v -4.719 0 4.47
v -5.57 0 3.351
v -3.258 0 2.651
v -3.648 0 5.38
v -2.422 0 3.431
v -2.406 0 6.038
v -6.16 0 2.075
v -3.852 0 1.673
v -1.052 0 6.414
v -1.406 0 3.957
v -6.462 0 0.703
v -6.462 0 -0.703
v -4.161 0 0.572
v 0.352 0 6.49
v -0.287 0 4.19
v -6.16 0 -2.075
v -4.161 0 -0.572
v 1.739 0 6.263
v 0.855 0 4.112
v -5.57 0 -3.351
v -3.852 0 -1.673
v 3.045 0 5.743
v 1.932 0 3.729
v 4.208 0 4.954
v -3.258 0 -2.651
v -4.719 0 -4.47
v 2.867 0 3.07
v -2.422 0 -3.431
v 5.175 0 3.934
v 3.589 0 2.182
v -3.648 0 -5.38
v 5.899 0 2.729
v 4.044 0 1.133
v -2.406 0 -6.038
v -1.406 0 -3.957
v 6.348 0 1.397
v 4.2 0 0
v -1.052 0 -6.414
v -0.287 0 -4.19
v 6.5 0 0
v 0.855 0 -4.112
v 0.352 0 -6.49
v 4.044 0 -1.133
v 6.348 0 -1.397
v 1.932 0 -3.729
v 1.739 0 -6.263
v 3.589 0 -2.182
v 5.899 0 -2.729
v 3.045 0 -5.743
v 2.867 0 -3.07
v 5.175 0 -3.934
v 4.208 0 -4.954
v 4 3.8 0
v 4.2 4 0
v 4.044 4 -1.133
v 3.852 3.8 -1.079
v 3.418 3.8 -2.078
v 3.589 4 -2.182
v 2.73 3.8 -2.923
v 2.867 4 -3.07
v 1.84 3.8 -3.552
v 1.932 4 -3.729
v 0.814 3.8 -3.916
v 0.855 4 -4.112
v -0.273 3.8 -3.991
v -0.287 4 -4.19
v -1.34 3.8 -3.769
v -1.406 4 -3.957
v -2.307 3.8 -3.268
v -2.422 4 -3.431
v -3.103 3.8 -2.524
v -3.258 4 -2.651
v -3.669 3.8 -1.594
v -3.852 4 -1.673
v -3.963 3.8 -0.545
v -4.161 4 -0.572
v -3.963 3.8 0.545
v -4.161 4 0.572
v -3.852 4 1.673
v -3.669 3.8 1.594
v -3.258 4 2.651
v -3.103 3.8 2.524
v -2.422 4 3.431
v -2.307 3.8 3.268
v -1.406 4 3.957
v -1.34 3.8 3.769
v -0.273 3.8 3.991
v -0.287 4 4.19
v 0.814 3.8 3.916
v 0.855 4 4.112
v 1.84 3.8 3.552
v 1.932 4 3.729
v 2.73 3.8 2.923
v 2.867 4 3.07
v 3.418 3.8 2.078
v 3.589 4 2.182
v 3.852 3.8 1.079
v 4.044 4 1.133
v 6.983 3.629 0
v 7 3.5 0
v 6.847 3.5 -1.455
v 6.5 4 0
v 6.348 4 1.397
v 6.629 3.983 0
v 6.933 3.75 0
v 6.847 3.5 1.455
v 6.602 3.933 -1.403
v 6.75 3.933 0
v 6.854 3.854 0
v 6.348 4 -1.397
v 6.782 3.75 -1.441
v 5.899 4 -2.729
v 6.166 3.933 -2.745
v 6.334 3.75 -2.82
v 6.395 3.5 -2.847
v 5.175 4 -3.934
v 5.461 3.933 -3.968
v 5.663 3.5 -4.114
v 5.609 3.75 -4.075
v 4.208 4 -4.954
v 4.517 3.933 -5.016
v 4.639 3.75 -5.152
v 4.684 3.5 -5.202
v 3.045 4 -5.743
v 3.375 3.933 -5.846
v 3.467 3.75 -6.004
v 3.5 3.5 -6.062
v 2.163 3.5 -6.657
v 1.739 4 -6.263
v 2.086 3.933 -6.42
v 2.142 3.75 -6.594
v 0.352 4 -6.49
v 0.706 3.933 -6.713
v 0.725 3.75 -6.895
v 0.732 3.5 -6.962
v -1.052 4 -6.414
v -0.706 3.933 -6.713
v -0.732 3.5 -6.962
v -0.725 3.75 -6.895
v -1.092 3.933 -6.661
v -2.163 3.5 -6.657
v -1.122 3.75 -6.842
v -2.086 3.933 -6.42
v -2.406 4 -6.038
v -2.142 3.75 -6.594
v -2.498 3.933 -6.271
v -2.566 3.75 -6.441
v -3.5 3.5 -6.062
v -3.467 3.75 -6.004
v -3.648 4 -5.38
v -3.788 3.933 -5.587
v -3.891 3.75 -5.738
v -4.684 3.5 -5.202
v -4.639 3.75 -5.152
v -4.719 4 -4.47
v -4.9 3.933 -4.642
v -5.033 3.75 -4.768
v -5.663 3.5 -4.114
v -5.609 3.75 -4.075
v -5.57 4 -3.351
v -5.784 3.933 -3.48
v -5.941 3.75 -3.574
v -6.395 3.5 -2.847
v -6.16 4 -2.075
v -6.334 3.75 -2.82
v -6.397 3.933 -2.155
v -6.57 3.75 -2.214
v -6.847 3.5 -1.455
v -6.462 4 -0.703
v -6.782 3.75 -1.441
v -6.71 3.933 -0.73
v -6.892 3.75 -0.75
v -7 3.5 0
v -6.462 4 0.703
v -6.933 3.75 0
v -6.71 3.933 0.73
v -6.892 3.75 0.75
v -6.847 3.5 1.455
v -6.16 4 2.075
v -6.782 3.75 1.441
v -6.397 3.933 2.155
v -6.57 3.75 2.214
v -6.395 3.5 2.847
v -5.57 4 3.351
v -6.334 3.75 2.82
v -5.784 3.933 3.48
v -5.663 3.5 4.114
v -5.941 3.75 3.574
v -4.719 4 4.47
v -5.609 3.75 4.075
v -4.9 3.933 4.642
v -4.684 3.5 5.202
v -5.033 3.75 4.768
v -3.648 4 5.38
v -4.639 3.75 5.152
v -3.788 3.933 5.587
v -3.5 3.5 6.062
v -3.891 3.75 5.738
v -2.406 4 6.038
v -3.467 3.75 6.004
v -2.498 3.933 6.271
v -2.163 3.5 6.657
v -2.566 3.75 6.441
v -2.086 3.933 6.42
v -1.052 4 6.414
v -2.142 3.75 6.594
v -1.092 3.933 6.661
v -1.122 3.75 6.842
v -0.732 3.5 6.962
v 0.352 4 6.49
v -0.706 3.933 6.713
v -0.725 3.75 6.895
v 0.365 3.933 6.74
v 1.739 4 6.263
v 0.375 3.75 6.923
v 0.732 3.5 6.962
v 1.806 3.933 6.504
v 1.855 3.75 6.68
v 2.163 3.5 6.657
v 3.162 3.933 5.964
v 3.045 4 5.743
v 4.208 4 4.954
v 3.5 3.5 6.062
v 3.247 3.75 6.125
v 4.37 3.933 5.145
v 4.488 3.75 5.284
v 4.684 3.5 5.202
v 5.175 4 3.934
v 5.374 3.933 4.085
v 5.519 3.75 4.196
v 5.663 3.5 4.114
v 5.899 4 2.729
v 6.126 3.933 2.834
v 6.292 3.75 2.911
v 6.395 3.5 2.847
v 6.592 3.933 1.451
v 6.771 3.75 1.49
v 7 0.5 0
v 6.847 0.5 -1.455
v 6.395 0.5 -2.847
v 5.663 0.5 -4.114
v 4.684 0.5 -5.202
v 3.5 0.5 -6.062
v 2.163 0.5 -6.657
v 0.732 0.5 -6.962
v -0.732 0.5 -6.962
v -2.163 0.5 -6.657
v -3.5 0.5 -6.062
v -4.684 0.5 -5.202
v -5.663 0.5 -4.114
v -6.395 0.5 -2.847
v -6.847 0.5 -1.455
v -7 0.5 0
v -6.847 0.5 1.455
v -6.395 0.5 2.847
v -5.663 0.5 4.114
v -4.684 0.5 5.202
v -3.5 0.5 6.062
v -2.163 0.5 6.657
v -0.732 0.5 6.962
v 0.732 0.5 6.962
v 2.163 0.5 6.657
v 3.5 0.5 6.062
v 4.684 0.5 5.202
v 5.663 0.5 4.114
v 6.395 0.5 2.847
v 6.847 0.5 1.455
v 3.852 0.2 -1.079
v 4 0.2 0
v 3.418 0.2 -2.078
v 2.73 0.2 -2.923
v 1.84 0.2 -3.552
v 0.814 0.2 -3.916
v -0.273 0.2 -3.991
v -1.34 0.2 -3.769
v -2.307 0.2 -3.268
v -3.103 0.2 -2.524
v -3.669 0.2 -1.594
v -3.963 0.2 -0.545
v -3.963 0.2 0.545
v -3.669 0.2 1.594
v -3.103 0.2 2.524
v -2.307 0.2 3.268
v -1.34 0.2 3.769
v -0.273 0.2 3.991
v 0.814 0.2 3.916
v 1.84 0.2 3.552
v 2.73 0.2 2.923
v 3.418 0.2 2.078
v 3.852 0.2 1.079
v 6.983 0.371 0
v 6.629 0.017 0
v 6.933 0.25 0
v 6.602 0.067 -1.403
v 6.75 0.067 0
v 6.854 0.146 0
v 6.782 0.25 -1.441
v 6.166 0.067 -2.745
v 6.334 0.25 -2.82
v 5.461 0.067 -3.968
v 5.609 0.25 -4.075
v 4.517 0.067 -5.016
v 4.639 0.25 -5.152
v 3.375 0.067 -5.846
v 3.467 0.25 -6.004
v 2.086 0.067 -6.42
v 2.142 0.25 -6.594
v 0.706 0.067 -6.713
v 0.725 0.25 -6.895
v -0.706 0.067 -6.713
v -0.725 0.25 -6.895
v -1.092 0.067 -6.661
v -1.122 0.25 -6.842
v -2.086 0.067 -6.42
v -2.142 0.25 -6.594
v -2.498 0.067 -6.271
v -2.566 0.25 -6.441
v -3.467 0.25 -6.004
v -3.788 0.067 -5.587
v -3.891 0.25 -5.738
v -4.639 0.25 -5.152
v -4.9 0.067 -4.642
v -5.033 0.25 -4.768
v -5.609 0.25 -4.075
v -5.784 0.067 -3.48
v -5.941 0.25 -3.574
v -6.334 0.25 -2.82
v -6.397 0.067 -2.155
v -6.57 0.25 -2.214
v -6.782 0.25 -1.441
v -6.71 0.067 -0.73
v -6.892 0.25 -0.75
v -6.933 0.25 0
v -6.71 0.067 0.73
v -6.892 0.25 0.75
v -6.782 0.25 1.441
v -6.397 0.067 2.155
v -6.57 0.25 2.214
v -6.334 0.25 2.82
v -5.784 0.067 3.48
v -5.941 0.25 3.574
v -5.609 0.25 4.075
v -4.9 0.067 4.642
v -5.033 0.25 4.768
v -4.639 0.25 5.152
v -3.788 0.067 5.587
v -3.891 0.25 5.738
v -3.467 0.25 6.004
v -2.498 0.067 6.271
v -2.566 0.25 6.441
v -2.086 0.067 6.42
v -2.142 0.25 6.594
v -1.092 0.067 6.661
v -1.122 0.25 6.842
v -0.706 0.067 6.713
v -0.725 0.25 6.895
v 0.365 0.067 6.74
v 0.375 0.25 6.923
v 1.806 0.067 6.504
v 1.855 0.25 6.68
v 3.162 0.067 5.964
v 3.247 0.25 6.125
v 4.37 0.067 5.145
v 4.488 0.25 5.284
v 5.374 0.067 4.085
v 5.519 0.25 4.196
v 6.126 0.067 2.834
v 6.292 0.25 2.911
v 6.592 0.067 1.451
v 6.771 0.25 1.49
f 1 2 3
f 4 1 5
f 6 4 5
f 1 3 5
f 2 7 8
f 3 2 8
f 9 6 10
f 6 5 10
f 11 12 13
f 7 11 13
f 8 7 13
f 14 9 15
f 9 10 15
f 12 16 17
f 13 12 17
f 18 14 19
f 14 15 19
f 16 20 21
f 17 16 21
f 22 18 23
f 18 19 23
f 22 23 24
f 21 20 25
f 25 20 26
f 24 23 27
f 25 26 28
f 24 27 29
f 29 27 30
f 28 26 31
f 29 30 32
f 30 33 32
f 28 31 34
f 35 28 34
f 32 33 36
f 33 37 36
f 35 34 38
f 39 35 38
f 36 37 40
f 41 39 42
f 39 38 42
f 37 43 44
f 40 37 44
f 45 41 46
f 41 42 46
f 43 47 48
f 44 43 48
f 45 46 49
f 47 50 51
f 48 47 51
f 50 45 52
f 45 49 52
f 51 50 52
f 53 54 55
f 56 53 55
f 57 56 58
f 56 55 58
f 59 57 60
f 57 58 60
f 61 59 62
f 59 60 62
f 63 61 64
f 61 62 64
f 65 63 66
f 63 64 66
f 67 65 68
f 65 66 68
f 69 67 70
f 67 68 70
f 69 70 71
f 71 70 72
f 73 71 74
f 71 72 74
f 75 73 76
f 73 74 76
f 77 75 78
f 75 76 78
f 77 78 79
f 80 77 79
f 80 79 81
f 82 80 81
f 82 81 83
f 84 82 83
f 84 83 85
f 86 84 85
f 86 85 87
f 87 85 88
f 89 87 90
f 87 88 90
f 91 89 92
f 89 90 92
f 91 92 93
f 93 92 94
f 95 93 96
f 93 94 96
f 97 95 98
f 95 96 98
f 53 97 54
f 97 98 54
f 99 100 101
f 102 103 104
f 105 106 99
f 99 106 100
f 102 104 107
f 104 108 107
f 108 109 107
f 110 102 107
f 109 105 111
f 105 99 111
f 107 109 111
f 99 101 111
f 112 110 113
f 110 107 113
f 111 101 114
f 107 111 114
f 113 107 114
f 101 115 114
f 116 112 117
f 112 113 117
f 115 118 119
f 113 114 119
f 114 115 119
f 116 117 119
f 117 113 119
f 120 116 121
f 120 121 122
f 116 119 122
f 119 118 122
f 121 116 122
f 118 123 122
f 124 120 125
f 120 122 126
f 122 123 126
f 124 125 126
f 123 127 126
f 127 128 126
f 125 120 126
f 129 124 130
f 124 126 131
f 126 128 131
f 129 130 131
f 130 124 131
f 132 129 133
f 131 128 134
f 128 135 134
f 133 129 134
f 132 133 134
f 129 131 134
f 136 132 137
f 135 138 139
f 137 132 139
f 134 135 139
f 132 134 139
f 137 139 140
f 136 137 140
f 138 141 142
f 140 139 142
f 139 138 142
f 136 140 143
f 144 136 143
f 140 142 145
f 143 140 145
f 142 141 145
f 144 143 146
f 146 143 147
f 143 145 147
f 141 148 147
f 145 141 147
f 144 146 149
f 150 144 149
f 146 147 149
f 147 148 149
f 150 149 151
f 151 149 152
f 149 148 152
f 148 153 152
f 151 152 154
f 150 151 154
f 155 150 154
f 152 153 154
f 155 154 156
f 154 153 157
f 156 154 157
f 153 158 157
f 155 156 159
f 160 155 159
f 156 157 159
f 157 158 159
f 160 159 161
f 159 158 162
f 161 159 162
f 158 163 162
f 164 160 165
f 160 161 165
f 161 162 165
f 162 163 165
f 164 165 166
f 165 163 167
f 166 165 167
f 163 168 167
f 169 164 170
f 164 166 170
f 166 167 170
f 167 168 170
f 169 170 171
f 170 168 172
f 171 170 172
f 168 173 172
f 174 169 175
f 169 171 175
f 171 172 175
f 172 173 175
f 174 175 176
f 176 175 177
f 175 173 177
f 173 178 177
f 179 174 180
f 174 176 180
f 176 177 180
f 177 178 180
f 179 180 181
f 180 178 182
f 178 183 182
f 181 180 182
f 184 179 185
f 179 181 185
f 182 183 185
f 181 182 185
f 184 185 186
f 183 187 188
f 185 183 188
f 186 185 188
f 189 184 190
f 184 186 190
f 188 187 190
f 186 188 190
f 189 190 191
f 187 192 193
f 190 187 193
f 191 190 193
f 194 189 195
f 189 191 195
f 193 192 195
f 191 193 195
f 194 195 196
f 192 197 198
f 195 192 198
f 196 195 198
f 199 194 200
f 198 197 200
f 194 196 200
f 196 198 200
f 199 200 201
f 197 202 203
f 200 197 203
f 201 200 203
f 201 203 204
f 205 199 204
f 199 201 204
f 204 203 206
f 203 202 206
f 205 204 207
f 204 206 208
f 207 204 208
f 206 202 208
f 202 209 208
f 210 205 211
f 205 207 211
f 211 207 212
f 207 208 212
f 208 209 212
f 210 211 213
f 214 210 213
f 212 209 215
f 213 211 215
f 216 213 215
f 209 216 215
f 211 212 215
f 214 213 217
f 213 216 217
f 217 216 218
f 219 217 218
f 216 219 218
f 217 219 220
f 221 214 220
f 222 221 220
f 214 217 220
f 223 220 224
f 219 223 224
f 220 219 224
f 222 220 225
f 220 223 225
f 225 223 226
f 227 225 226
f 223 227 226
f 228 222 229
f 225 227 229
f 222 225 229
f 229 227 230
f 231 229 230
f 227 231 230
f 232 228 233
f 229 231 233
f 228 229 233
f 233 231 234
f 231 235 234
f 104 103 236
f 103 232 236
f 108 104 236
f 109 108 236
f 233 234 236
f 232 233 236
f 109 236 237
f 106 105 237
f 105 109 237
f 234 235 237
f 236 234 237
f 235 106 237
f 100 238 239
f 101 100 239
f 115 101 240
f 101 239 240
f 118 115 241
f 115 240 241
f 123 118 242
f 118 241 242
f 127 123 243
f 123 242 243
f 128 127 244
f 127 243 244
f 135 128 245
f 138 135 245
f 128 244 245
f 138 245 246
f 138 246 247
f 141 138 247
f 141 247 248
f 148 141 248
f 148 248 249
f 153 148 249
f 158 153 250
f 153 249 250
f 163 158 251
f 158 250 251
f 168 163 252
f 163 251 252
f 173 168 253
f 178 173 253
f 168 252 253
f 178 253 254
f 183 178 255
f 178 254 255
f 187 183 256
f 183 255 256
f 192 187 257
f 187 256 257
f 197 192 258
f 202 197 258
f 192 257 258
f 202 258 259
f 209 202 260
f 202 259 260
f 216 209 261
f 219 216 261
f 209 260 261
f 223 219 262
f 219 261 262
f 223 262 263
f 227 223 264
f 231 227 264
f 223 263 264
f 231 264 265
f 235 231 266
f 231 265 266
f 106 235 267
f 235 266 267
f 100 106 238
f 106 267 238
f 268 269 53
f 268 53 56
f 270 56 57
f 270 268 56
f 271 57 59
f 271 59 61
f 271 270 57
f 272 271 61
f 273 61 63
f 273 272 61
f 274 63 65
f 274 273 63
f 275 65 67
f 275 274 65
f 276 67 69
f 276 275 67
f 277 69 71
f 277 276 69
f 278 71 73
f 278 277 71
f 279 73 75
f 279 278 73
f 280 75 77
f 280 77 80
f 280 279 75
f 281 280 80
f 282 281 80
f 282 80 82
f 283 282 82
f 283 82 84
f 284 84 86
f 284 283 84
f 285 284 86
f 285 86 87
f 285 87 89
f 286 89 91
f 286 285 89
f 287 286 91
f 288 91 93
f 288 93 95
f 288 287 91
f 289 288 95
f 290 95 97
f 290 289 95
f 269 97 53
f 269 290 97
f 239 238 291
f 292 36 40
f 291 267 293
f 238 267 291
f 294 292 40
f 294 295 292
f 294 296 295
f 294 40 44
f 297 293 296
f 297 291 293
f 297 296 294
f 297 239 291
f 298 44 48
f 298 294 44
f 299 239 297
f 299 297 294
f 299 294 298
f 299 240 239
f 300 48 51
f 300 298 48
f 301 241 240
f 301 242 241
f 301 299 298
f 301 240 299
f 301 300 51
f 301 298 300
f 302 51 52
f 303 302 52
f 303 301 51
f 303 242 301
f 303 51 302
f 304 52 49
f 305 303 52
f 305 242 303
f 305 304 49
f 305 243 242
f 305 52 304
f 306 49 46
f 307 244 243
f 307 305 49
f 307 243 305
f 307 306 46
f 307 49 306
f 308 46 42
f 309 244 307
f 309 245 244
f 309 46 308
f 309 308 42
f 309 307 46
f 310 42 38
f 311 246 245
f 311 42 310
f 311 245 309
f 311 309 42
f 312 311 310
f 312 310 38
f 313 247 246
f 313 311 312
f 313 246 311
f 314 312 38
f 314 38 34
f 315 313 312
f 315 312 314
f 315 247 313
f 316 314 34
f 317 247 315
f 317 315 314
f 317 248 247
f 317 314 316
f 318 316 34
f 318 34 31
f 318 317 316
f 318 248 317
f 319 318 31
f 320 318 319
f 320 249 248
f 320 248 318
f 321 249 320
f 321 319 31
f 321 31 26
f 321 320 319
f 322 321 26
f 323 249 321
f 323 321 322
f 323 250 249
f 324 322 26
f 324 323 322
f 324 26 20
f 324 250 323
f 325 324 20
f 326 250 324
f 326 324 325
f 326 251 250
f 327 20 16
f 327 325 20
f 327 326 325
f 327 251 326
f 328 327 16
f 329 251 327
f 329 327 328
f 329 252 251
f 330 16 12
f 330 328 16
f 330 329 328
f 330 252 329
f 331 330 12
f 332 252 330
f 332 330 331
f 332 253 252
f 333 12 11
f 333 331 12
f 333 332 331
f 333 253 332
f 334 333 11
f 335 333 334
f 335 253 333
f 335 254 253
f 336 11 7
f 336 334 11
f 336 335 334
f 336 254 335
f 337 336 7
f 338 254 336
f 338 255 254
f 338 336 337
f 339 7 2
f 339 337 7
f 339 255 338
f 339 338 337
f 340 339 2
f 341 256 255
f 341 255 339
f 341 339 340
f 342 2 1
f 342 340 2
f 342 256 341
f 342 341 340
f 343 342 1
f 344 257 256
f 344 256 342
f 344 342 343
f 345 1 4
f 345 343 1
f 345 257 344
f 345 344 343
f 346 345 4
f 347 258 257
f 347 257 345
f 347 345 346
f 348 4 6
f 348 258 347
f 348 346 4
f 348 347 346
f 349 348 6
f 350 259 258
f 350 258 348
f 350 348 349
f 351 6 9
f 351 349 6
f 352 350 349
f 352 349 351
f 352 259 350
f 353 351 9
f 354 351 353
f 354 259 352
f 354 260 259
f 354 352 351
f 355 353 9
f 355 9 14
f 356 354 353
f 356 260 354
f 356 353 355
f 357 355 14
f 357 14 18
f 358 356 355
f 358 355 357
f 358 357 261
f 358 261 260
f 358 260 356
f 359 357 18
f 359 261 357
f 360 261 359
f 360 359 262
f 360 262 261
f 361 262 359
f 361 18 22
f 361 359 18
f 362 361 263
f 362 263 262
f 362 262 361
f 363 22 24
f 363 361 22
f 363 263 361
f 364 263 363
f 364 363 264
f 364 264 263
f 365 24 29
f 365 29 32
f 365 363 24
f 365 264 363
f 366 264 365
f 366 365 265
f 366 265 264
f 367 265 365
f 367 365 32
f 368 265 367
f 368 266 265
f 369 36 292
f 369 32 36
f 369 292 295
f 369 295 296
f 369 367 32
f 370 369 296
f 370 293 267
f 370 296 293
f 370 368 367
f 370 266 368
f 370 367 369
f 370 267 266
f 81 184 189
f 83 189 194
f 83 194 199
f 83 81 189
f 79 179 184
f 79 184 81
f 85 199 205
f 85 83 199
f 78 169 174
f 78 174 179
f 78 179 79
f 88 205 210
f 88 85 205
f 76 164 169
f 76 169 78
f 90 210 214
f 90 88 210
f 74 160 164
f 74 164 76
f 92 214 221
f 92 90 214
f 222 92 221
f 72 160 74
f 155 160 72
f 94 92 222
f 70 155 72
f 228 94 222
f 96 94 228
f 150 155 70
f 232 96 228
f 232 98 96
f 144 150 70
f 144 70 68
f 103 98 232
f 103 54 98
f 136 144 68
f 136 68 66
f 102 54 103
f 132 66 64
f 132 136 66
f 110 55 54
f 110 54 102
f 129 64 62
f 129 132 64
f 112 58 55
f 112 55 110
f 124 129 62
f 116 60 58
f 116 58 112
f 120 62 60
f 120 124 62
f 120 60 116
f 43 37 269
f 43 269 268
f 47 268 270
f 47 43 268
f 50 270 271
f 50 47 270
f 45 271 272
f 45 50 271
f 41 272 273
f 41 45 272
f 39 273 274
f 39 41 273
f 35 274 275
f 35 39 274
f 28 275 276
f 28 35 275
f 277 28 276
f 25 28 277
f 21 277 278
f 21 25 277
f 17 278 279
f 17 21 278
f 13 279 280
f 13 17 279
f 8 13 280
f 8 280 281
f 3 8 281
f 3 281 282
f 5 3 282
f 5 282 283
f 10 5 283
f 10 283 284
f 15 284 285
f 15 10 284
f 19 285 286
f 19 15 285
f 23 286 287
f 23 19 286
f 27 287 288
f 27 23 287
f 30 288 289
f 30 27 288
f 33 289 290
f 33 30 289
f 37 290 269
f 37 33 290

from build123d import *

# Parameters (mm, degrees)
SKETCH1_R           = 7
SKETCH1_R_2         = 4
BOSS_EXTRUDE1_DEPTH = 4
CHAMFER1_SIZE       = 0.2
FILLET1_R           = 0.5


with BuildPart() as part:
    # Sketch1 → Boss-Extrude1 (new body)
    with BuildSketch(Plane(origin=(0, 0, 0), x_dir=(1, 0, 0), z_dir=(0, 1, 0))):
        Circle(SKETCH1_R)
        Circle(SKETCH1_R_2, mode=Mode.SUBTRACT)
    extrude(amount=BOSS_EXTRUDE1_DEPTH)

    # Chamfer1
    chamfer1_edges = [part.edges().sort_by_distance(p)[0] for p in [
        (-4, 0, 0),
        (-4, 4, 0),
    ]]
    chamfer(chamfer1_edges, length=CHAMFER1_SIZE)

    # Fillet1
    fillet1_edges = [part.edges().sort_by_distance(p)[0] for p in [
        (-7, 0, 0),
        (-7, 4, 0),
    ]]
    fillet(fillet1_edges, radius=FILLET1_R)


solid = part.part
